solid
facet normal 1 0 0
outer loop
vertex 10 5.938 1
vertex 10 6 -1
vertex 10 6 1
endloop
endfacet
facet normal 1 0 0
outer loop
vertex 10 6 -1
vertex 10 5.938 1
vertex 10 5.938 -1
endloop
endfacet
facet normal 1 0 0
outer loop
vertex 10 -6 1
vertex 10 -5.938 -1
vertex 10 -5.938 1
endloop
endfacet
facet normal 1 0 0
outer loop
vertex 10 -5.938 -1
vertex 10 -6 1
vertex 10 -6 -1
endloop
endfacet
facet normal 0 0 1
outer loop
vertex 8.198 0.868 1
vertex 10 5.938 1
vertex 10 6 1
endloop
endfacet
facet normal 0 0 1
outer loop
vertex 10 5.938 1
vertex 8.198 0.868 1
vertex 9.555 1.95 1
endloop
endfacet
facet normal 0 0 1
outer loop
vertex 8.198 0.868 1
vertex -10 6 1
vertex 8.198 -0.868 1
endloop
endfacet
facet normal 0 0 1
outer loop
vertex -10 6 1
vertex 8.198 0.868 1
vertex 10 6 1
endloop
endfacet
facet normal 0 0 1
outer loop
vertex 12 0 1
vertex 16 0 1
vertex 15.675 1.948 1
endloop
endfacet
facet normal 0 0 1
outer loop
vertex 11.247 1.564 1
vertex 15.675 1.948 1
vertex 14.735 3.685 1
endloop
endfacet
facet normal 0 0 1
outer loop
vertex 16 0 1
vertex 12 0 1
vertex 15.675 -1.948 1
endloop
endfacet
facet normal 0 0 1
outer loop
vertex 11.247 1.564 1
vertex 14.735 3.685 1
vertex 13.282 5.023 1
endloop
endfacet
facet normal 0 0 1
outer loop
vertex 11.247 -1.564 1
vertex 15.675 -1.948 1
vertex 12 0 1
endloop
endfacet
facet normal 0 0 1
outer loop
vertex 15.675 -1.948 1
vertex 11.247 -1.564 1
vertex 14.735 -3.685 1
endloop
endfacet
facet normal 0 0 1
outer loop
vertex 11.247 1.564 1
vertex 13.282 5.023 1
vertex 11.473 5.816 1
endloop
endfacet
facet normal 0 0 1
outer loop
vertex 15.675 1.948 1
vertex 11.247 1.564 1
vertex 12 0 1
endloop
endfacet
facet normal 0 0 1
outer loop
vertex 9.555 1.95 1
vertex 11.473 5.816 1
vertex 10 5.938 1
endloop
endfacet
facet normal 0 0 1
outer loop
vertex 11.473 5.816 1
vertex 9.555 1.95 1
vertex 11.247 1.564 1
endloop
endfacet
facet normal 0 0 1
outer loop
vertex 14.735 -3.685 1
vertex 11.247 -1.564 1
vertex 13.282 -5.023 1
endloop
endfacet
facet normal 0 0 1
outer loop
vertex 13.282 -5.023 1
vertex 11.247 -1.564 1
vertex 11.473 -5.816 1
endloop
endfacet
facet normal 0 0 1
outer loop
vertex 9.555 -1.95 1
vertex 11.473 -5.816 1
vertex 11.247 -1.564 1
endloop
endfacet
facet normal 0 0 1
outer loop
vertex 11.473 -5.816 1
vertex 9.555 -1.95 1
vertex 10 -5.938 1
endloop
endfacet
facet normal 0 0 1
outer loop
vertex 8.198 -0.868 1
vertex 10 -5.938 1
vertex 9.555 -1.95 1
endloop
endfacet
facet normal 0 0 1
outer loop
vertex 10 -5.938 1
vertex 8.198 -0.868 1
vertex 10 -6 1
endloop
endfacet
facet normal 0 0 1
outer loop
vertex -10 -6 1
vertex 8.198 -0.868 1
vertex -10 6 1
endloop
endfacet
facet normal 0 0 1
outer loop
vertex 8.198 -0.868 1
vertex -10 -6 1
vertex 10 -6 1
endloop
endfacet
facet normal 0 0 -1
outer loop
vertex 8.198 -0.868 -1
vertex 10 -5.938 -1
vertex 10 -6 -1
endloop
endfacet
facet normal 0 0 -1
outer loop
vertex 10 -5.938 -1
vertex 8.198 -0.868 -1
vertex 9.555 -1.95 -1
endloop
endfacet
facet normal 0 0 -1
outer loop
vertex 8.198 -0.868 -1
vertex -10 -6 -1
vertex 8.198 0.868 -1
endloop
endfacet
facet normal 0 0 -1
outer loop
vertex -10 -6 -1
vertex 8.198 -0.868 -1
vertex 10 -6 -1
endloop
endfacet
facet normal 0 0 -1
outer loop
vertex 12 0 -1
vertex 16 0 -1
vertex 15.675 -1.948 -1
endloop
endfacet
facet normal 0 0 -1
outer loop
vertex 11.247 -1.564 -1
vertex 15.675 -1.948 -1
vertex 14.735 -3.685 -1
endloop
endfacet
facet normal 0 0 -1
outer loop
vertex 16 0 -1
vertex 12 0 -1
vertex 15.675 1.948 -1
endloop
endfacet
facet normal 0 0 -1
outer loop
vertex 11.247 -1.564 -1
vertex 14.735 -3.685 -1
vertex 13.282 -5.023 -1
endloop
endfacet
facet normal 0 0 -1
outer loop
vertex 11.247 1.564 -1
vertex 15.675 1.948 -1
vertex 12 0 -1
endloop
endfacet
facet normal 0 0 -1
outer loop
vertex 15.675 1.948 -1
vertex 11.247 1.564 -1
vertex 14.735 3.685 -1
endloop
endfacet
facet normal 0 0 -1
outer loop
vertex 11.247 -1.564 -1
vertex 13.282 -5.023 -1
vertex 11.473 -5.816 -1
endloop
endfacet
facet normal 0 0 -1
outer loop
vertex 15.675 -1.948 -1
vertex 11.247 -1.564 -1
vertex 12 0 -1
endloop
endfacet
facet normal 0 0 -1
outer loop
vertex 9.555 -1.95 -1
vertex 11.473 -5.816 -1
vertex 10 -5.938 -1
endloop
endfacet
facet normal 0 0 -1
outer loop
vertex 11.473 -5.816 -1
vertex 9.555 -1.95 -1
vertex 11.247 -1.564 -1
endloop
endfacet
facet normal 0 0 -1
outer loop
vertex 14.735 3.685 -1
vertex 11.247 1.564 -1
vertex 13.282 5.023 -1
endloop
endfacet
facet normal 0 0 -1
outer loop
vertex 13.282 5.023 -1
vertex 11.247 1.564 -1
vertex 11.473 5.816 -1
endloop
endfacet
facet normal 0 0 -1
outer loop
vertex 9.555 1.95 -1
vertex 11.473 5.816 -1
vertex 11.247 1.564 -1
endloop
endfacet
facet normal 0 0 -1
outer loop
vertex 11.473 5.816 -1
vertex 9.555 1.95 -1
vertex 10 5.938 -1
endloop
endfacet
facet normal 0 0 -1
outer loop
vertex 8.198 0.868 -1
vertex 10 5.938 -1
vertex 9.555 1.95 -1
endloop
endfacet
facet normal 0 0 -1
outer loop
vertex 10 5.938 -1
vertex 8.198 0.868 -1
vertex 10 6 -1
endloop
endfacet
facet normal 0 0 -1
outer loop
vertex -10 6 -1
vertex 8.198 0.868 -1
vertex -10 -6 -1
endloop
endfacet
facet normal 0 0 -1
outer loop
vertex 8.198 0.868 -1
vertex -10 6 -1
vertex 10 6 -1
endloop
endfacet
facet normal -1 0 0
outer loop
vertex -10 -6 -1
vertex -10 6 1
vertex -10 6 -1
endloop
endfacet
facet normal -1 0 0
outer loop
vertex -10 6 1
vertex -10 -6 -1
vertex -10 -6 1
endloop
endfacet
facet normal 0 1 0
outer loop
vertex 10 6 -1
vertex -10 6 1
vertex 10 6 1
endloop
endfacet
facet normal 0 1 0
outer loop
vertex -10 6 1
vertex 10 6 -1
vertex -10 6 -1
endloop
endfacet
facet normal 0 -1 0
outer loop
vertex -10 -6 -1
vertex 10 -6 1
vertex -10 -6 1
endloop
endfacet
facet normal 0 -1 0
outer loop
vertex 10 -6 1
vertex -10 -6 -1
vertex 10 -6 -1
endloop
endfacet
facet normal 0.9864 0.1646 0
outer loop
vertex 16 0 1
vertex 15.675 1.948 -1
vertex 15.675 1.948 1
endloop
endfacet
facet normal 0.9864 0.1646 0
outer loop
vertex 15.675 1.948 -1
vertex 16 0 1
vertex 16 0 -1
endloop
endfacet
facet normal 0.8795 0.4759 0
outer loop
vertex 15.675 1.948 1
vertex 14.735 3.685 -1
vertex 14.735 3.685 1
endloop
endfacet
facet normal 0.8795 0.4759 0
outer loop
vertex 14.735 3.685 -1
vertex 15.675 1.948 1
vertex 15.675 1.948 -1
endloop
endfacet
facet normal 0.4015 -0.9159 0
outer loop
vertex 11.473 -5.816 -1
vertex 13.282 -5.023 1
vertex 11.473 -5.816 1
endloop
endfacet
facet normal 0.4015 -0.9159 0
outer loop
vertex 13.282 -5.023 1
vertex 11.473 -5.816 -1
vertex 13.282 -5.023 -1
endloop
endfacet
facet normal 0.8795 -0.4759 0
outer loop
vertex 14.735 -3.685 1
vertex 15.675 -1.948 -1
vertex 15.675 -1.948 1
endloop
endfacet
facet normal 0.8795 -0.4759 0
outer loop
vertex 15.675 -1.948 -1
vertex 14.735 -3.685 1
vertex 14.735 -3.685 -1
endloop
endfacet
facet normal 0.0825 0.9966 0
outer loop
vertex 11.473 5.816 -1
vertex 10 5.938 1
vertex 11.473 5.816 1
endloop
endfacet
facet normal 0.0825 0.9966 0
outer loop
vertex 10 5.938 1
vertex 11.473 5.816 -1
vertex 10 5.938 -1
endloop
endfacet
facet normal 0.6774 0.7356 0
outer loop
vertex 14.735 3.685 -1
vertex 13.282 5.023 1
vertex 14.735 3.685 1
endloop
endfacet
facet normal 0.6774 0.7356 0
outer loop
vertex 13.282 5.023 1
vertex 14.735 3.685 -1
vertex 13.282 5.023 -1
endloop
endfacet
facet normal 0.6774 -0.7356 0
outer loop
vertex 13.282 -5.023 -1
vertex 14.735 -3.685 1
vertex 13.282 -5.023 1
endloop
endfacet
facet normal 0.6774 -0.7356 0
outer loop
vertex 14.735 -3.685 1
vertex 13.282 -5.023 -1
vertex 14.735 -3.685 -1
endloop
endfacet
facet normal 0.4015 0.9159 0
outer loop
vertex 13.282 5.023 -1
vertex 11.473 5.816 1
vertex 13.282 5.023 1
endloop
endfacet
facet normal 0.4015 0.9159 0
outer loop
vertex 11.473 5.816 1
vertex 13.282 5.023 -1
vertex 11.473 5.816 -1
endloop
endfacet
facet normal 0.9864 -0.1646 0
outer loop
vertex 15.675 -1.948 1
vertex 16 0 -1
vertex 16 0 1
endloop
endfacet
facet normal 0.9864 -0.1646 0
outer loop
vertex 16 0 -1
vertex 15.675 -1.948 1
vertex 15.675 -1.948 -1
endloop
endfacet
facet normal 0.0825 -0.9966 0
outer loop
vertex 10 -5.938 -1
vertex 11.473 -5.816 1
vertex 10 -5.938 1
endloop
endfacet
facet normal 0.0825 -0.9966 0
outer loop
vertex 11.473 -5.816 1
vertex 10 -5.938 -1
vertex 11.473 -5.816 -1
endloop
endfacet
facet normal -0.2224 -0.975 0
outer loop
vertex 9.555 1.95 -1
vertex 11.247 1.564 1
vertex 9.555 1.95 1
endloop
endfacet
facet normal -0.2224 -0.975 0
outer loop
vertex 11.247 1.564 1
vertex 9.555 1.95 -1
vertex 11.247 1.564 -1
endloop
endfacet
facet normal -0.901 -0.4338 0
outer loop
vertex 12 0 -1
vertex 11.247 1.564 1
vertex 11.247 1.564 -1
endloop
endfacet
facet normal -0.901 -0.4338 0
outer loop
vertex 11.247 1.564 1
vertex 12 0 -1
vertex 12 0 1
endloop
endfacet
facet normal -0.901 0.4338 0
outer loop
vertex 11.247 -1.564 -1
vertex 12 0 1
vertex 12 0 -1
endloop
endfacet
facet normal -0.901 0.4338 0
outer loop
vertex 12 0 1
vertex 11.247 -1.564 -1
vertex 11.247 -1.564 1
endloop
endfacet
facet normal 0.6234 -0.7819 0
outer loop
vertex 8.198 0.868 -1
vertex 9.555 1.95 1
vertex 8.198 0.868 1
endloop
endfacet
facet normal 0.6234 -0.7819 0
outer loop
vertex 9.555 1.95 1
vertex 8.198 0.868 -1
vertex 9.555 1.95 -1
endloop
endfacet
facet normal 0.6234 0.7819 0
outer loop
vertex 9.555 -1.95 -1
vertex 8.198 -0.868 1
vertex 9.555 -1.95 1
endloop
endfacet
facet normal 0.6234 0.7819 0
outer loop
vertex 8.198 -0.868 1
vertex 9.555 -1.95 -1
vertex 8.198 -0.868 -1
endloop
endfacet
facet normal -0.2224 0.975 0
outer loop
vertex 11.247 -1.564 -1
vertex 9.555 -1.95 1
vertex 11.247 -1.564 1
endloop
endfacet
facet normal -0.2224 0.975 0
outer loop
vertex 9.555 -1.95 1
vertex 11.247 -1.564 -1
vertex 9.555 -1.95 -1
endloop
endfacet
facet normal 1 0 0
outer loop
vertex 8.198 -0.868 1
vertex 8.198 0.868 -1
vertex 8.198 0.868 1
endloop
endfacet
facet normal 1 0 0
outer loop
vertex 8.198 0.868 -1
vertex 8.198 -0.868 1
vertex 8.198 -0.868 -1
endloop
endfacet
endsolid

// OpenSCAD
/*
 * Written by Dermot Tynan, Kalopa Research.
 * GPLv2.
 *
 * All dimensions are in mm.
 */

/*
 * Create a screw tab to be attached to something like a
 * box or plate.
 */
module screw_tab(length, screw_dia, thickness)
{
	tab_width = screw_dia * 3;
	difference() {
		union() {
			cube([length, tab_width, thickness], center = true);
			translate([length / 2, 0, 0])
				cylinder(r = tab_width / 2, h = thickness, center = true);
		}
		translate([length / 2, 0, 0])
			cylinder(r = screw_dia / 2, h = thickness + 2, center = true);
	}
}

screw_tab(20, 4, 2);
